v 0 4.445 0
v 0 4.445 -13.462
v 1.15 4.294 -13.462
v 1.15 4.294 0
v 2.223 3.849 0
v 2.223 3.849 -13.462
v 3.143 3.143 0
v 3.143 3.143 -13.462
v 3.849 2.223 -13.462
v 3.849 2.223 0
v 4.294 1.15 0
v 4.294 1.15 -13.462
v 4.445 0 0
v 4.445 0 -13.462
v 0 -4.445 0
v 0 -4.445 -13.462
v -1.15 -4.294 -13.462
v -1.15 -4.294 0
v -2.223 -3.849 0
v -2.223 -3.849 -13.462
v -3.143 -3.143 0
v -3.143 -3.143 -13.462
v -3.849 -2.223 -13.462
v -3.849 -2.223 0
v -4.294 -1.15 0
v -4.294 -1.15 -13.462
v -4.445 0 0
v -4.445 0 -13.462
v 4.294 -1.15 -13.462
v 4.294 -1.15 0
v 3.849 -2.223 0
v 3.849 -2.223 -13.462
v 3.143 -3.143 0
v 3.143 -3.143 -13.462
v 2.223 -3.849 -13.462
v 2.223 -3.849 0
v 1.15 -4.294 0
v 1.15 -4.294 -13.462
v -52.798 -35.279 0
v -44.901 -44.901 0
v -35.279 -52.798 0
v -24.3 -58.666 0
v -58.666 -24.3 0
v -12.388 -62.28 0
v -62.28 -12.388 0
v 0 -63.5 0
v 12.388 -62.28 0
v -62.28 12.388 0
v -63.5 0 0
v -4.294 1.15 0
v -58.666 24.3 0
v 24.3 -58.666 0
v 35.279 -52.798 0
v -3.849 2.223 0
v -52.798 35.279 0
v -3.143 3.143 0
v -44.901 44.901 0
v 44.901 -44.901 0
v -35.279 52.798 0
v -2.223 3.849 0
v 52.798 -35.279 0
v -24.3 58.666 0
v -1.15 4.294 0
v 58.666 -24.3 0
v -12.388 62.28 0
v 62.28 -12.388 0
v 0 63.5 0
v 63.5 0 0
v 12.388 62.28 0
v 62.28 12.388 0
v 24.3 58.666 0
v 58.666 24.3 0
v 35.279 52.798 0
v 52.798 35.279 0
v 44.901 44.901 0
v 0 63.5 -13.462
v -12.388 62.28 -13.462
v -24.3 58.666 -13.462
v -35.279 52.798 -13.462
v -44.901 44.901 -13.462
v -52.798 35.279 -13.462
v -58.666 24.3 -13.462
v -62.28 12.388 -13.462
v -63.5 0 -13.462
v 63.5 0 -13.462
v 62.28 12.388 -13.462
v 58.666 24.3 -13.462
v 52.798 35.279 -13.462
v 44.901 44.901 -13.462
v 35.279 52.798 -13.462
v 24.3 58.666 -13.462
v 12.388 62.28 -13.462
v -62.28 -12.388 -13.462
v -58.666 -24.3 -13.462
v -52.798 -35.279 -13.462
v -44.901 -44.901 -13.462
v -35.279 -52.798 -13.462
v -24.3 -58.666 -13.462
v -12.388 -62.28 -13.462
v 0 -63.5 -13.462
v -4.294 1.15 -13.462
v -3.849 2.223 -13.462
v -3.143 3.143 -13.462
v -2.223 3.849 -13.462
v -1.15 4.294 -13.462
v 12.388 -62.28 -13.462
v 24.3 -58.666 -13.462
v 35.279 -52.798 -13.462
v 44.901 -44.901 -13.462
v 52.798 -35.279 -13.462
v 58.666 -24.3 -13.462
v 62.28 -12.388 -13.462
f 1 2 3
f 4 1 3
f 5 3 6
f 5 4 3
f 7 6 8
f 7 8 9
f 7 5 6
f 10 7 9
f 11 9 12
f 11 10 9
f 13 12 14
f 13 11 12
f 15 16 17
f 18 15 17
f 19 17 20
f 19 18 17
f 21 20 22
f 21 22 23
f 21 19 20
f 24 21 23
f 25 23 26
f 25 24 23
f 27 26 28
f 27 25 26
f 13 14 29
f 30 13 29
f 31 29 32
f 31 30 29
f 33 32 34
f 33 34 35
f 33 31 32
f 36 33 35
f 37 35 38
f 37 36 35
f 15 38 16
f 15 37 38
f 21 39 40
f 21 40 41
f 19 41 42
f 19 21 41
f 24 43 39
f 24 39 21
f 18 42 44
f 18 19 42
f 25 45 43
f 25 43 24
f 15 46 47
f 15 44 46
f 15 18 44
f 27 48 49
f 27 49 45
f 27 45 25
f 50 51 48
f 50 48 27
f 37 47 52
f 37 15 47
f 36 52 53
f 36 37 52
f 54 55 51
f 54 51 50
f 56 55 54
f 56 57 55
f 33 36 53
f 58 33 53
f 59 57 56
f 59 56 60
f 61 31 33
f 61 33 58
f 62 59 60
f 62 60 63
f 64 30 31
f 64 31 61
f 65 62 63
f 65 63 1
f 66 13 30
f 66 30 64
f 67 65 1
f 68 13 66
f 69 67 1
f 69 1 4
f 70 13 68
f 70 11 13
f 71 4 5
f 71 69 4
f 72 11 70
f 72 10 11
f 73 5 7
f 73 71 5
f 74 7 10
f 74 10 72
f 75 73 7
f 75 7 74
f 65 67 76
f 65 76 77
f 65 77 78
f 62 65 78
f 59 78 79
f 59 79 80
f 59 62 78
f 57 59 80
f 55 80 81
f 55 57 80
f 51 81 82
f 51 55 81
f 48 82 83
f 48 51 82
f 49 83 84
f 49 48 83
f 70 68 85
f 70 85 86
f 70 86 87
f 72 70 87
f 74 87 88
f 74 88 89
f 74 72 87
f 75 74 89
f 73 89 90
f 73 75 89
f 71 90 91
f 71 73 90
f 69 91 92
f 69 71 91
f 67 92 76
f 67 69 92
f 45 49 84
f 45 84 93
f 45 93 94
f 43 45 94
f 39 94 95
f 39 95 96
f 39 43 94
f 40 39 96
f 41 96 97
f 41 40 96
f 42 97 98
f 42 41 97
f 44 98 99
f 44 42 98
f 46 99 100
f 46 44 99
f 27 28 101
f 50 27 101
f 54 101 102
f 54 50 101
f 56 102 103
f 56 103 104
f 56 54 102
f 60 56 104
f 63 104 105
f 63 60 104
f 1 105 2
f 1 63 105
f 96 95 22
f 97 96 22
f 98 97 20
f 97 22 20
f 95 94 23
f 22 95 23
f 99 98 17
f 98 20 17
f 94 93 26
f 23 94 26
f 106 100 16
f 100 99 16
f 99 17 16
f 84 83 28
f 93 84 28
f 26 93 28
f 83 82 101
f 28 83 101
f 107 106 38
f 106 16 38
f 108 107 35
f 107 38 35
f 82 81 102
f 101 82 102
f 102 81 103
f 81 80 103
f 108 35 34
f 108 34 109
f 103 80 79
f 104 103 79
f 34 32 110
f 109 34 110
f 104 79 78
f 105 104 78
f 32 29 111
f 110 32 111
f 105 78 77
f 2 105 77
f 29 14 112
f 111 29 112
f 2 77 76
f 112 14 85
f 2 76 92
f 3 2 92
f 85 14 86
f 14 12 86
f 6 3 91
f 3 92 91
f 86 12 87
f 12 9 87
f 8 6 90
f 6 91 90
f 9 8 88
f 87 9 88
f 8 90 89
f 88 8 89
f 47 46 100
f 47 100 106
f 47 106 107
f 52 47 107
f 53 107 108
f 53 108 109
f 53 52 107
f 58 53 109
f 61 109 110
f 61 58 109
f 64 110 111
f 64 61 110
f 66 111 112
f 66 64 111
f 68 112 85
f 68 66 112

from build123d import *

# Parameters (mm, degrees)
F1_DEPTH = 13.462


with BuildPart() as f1:
    # F0 (on Top) → F1 (new body)
    with BuildSketch(Plane.XY):
        with BuildLine():
            ThreePointArc((0, -63.5), (44.901281, -44.901281), (63.5, 0))
            Line((63.5, 0), (4.445, 0))
            ThreePointArc((4.445, 0), (3.14309, -3.14309), (0, -4.445))
            Line((0, -4.445), (0, -63.5))
        make_face()
        with BuildLine():
            ThreePointArc((-63.5, 0), (-44.901281, -44.901281), (0, -63.5))
            Line((0, -63.5), (0, -4.445))
            ThreePointArc((0, -4.445), (-3.14309, -3.14309), (-4.445, 0))
            Line((-4.445, 0), (-63.5, 0))
        make_face()
        with BuildLine():
            Line((4.445, 0), (63.5, 0))
            ThreePointArc((63.5, 0), (44.901281, 44.901281), (0, 63.5))
            Line((0, 63.5), (0, 4.445))
            ThreePointArc((0, 4.445), (3.14309, 3.14309), (4.445, 0))
        make_face()
        with BuildLine():
            Line((0, 4.445), (0, 63.5))
            ThreePointArc((0, 63.5), (-44.901281, 44.901281), (-63.5, 0))
            Line((-63.5, 0), (-4.445, 0))
            ThreePointArc((-4.445, 0), (-3.14309, 3.14309), (0, 4.445))
        make_face()
    extrude(amount=-F1_DEPTH)


solid = f1.part
